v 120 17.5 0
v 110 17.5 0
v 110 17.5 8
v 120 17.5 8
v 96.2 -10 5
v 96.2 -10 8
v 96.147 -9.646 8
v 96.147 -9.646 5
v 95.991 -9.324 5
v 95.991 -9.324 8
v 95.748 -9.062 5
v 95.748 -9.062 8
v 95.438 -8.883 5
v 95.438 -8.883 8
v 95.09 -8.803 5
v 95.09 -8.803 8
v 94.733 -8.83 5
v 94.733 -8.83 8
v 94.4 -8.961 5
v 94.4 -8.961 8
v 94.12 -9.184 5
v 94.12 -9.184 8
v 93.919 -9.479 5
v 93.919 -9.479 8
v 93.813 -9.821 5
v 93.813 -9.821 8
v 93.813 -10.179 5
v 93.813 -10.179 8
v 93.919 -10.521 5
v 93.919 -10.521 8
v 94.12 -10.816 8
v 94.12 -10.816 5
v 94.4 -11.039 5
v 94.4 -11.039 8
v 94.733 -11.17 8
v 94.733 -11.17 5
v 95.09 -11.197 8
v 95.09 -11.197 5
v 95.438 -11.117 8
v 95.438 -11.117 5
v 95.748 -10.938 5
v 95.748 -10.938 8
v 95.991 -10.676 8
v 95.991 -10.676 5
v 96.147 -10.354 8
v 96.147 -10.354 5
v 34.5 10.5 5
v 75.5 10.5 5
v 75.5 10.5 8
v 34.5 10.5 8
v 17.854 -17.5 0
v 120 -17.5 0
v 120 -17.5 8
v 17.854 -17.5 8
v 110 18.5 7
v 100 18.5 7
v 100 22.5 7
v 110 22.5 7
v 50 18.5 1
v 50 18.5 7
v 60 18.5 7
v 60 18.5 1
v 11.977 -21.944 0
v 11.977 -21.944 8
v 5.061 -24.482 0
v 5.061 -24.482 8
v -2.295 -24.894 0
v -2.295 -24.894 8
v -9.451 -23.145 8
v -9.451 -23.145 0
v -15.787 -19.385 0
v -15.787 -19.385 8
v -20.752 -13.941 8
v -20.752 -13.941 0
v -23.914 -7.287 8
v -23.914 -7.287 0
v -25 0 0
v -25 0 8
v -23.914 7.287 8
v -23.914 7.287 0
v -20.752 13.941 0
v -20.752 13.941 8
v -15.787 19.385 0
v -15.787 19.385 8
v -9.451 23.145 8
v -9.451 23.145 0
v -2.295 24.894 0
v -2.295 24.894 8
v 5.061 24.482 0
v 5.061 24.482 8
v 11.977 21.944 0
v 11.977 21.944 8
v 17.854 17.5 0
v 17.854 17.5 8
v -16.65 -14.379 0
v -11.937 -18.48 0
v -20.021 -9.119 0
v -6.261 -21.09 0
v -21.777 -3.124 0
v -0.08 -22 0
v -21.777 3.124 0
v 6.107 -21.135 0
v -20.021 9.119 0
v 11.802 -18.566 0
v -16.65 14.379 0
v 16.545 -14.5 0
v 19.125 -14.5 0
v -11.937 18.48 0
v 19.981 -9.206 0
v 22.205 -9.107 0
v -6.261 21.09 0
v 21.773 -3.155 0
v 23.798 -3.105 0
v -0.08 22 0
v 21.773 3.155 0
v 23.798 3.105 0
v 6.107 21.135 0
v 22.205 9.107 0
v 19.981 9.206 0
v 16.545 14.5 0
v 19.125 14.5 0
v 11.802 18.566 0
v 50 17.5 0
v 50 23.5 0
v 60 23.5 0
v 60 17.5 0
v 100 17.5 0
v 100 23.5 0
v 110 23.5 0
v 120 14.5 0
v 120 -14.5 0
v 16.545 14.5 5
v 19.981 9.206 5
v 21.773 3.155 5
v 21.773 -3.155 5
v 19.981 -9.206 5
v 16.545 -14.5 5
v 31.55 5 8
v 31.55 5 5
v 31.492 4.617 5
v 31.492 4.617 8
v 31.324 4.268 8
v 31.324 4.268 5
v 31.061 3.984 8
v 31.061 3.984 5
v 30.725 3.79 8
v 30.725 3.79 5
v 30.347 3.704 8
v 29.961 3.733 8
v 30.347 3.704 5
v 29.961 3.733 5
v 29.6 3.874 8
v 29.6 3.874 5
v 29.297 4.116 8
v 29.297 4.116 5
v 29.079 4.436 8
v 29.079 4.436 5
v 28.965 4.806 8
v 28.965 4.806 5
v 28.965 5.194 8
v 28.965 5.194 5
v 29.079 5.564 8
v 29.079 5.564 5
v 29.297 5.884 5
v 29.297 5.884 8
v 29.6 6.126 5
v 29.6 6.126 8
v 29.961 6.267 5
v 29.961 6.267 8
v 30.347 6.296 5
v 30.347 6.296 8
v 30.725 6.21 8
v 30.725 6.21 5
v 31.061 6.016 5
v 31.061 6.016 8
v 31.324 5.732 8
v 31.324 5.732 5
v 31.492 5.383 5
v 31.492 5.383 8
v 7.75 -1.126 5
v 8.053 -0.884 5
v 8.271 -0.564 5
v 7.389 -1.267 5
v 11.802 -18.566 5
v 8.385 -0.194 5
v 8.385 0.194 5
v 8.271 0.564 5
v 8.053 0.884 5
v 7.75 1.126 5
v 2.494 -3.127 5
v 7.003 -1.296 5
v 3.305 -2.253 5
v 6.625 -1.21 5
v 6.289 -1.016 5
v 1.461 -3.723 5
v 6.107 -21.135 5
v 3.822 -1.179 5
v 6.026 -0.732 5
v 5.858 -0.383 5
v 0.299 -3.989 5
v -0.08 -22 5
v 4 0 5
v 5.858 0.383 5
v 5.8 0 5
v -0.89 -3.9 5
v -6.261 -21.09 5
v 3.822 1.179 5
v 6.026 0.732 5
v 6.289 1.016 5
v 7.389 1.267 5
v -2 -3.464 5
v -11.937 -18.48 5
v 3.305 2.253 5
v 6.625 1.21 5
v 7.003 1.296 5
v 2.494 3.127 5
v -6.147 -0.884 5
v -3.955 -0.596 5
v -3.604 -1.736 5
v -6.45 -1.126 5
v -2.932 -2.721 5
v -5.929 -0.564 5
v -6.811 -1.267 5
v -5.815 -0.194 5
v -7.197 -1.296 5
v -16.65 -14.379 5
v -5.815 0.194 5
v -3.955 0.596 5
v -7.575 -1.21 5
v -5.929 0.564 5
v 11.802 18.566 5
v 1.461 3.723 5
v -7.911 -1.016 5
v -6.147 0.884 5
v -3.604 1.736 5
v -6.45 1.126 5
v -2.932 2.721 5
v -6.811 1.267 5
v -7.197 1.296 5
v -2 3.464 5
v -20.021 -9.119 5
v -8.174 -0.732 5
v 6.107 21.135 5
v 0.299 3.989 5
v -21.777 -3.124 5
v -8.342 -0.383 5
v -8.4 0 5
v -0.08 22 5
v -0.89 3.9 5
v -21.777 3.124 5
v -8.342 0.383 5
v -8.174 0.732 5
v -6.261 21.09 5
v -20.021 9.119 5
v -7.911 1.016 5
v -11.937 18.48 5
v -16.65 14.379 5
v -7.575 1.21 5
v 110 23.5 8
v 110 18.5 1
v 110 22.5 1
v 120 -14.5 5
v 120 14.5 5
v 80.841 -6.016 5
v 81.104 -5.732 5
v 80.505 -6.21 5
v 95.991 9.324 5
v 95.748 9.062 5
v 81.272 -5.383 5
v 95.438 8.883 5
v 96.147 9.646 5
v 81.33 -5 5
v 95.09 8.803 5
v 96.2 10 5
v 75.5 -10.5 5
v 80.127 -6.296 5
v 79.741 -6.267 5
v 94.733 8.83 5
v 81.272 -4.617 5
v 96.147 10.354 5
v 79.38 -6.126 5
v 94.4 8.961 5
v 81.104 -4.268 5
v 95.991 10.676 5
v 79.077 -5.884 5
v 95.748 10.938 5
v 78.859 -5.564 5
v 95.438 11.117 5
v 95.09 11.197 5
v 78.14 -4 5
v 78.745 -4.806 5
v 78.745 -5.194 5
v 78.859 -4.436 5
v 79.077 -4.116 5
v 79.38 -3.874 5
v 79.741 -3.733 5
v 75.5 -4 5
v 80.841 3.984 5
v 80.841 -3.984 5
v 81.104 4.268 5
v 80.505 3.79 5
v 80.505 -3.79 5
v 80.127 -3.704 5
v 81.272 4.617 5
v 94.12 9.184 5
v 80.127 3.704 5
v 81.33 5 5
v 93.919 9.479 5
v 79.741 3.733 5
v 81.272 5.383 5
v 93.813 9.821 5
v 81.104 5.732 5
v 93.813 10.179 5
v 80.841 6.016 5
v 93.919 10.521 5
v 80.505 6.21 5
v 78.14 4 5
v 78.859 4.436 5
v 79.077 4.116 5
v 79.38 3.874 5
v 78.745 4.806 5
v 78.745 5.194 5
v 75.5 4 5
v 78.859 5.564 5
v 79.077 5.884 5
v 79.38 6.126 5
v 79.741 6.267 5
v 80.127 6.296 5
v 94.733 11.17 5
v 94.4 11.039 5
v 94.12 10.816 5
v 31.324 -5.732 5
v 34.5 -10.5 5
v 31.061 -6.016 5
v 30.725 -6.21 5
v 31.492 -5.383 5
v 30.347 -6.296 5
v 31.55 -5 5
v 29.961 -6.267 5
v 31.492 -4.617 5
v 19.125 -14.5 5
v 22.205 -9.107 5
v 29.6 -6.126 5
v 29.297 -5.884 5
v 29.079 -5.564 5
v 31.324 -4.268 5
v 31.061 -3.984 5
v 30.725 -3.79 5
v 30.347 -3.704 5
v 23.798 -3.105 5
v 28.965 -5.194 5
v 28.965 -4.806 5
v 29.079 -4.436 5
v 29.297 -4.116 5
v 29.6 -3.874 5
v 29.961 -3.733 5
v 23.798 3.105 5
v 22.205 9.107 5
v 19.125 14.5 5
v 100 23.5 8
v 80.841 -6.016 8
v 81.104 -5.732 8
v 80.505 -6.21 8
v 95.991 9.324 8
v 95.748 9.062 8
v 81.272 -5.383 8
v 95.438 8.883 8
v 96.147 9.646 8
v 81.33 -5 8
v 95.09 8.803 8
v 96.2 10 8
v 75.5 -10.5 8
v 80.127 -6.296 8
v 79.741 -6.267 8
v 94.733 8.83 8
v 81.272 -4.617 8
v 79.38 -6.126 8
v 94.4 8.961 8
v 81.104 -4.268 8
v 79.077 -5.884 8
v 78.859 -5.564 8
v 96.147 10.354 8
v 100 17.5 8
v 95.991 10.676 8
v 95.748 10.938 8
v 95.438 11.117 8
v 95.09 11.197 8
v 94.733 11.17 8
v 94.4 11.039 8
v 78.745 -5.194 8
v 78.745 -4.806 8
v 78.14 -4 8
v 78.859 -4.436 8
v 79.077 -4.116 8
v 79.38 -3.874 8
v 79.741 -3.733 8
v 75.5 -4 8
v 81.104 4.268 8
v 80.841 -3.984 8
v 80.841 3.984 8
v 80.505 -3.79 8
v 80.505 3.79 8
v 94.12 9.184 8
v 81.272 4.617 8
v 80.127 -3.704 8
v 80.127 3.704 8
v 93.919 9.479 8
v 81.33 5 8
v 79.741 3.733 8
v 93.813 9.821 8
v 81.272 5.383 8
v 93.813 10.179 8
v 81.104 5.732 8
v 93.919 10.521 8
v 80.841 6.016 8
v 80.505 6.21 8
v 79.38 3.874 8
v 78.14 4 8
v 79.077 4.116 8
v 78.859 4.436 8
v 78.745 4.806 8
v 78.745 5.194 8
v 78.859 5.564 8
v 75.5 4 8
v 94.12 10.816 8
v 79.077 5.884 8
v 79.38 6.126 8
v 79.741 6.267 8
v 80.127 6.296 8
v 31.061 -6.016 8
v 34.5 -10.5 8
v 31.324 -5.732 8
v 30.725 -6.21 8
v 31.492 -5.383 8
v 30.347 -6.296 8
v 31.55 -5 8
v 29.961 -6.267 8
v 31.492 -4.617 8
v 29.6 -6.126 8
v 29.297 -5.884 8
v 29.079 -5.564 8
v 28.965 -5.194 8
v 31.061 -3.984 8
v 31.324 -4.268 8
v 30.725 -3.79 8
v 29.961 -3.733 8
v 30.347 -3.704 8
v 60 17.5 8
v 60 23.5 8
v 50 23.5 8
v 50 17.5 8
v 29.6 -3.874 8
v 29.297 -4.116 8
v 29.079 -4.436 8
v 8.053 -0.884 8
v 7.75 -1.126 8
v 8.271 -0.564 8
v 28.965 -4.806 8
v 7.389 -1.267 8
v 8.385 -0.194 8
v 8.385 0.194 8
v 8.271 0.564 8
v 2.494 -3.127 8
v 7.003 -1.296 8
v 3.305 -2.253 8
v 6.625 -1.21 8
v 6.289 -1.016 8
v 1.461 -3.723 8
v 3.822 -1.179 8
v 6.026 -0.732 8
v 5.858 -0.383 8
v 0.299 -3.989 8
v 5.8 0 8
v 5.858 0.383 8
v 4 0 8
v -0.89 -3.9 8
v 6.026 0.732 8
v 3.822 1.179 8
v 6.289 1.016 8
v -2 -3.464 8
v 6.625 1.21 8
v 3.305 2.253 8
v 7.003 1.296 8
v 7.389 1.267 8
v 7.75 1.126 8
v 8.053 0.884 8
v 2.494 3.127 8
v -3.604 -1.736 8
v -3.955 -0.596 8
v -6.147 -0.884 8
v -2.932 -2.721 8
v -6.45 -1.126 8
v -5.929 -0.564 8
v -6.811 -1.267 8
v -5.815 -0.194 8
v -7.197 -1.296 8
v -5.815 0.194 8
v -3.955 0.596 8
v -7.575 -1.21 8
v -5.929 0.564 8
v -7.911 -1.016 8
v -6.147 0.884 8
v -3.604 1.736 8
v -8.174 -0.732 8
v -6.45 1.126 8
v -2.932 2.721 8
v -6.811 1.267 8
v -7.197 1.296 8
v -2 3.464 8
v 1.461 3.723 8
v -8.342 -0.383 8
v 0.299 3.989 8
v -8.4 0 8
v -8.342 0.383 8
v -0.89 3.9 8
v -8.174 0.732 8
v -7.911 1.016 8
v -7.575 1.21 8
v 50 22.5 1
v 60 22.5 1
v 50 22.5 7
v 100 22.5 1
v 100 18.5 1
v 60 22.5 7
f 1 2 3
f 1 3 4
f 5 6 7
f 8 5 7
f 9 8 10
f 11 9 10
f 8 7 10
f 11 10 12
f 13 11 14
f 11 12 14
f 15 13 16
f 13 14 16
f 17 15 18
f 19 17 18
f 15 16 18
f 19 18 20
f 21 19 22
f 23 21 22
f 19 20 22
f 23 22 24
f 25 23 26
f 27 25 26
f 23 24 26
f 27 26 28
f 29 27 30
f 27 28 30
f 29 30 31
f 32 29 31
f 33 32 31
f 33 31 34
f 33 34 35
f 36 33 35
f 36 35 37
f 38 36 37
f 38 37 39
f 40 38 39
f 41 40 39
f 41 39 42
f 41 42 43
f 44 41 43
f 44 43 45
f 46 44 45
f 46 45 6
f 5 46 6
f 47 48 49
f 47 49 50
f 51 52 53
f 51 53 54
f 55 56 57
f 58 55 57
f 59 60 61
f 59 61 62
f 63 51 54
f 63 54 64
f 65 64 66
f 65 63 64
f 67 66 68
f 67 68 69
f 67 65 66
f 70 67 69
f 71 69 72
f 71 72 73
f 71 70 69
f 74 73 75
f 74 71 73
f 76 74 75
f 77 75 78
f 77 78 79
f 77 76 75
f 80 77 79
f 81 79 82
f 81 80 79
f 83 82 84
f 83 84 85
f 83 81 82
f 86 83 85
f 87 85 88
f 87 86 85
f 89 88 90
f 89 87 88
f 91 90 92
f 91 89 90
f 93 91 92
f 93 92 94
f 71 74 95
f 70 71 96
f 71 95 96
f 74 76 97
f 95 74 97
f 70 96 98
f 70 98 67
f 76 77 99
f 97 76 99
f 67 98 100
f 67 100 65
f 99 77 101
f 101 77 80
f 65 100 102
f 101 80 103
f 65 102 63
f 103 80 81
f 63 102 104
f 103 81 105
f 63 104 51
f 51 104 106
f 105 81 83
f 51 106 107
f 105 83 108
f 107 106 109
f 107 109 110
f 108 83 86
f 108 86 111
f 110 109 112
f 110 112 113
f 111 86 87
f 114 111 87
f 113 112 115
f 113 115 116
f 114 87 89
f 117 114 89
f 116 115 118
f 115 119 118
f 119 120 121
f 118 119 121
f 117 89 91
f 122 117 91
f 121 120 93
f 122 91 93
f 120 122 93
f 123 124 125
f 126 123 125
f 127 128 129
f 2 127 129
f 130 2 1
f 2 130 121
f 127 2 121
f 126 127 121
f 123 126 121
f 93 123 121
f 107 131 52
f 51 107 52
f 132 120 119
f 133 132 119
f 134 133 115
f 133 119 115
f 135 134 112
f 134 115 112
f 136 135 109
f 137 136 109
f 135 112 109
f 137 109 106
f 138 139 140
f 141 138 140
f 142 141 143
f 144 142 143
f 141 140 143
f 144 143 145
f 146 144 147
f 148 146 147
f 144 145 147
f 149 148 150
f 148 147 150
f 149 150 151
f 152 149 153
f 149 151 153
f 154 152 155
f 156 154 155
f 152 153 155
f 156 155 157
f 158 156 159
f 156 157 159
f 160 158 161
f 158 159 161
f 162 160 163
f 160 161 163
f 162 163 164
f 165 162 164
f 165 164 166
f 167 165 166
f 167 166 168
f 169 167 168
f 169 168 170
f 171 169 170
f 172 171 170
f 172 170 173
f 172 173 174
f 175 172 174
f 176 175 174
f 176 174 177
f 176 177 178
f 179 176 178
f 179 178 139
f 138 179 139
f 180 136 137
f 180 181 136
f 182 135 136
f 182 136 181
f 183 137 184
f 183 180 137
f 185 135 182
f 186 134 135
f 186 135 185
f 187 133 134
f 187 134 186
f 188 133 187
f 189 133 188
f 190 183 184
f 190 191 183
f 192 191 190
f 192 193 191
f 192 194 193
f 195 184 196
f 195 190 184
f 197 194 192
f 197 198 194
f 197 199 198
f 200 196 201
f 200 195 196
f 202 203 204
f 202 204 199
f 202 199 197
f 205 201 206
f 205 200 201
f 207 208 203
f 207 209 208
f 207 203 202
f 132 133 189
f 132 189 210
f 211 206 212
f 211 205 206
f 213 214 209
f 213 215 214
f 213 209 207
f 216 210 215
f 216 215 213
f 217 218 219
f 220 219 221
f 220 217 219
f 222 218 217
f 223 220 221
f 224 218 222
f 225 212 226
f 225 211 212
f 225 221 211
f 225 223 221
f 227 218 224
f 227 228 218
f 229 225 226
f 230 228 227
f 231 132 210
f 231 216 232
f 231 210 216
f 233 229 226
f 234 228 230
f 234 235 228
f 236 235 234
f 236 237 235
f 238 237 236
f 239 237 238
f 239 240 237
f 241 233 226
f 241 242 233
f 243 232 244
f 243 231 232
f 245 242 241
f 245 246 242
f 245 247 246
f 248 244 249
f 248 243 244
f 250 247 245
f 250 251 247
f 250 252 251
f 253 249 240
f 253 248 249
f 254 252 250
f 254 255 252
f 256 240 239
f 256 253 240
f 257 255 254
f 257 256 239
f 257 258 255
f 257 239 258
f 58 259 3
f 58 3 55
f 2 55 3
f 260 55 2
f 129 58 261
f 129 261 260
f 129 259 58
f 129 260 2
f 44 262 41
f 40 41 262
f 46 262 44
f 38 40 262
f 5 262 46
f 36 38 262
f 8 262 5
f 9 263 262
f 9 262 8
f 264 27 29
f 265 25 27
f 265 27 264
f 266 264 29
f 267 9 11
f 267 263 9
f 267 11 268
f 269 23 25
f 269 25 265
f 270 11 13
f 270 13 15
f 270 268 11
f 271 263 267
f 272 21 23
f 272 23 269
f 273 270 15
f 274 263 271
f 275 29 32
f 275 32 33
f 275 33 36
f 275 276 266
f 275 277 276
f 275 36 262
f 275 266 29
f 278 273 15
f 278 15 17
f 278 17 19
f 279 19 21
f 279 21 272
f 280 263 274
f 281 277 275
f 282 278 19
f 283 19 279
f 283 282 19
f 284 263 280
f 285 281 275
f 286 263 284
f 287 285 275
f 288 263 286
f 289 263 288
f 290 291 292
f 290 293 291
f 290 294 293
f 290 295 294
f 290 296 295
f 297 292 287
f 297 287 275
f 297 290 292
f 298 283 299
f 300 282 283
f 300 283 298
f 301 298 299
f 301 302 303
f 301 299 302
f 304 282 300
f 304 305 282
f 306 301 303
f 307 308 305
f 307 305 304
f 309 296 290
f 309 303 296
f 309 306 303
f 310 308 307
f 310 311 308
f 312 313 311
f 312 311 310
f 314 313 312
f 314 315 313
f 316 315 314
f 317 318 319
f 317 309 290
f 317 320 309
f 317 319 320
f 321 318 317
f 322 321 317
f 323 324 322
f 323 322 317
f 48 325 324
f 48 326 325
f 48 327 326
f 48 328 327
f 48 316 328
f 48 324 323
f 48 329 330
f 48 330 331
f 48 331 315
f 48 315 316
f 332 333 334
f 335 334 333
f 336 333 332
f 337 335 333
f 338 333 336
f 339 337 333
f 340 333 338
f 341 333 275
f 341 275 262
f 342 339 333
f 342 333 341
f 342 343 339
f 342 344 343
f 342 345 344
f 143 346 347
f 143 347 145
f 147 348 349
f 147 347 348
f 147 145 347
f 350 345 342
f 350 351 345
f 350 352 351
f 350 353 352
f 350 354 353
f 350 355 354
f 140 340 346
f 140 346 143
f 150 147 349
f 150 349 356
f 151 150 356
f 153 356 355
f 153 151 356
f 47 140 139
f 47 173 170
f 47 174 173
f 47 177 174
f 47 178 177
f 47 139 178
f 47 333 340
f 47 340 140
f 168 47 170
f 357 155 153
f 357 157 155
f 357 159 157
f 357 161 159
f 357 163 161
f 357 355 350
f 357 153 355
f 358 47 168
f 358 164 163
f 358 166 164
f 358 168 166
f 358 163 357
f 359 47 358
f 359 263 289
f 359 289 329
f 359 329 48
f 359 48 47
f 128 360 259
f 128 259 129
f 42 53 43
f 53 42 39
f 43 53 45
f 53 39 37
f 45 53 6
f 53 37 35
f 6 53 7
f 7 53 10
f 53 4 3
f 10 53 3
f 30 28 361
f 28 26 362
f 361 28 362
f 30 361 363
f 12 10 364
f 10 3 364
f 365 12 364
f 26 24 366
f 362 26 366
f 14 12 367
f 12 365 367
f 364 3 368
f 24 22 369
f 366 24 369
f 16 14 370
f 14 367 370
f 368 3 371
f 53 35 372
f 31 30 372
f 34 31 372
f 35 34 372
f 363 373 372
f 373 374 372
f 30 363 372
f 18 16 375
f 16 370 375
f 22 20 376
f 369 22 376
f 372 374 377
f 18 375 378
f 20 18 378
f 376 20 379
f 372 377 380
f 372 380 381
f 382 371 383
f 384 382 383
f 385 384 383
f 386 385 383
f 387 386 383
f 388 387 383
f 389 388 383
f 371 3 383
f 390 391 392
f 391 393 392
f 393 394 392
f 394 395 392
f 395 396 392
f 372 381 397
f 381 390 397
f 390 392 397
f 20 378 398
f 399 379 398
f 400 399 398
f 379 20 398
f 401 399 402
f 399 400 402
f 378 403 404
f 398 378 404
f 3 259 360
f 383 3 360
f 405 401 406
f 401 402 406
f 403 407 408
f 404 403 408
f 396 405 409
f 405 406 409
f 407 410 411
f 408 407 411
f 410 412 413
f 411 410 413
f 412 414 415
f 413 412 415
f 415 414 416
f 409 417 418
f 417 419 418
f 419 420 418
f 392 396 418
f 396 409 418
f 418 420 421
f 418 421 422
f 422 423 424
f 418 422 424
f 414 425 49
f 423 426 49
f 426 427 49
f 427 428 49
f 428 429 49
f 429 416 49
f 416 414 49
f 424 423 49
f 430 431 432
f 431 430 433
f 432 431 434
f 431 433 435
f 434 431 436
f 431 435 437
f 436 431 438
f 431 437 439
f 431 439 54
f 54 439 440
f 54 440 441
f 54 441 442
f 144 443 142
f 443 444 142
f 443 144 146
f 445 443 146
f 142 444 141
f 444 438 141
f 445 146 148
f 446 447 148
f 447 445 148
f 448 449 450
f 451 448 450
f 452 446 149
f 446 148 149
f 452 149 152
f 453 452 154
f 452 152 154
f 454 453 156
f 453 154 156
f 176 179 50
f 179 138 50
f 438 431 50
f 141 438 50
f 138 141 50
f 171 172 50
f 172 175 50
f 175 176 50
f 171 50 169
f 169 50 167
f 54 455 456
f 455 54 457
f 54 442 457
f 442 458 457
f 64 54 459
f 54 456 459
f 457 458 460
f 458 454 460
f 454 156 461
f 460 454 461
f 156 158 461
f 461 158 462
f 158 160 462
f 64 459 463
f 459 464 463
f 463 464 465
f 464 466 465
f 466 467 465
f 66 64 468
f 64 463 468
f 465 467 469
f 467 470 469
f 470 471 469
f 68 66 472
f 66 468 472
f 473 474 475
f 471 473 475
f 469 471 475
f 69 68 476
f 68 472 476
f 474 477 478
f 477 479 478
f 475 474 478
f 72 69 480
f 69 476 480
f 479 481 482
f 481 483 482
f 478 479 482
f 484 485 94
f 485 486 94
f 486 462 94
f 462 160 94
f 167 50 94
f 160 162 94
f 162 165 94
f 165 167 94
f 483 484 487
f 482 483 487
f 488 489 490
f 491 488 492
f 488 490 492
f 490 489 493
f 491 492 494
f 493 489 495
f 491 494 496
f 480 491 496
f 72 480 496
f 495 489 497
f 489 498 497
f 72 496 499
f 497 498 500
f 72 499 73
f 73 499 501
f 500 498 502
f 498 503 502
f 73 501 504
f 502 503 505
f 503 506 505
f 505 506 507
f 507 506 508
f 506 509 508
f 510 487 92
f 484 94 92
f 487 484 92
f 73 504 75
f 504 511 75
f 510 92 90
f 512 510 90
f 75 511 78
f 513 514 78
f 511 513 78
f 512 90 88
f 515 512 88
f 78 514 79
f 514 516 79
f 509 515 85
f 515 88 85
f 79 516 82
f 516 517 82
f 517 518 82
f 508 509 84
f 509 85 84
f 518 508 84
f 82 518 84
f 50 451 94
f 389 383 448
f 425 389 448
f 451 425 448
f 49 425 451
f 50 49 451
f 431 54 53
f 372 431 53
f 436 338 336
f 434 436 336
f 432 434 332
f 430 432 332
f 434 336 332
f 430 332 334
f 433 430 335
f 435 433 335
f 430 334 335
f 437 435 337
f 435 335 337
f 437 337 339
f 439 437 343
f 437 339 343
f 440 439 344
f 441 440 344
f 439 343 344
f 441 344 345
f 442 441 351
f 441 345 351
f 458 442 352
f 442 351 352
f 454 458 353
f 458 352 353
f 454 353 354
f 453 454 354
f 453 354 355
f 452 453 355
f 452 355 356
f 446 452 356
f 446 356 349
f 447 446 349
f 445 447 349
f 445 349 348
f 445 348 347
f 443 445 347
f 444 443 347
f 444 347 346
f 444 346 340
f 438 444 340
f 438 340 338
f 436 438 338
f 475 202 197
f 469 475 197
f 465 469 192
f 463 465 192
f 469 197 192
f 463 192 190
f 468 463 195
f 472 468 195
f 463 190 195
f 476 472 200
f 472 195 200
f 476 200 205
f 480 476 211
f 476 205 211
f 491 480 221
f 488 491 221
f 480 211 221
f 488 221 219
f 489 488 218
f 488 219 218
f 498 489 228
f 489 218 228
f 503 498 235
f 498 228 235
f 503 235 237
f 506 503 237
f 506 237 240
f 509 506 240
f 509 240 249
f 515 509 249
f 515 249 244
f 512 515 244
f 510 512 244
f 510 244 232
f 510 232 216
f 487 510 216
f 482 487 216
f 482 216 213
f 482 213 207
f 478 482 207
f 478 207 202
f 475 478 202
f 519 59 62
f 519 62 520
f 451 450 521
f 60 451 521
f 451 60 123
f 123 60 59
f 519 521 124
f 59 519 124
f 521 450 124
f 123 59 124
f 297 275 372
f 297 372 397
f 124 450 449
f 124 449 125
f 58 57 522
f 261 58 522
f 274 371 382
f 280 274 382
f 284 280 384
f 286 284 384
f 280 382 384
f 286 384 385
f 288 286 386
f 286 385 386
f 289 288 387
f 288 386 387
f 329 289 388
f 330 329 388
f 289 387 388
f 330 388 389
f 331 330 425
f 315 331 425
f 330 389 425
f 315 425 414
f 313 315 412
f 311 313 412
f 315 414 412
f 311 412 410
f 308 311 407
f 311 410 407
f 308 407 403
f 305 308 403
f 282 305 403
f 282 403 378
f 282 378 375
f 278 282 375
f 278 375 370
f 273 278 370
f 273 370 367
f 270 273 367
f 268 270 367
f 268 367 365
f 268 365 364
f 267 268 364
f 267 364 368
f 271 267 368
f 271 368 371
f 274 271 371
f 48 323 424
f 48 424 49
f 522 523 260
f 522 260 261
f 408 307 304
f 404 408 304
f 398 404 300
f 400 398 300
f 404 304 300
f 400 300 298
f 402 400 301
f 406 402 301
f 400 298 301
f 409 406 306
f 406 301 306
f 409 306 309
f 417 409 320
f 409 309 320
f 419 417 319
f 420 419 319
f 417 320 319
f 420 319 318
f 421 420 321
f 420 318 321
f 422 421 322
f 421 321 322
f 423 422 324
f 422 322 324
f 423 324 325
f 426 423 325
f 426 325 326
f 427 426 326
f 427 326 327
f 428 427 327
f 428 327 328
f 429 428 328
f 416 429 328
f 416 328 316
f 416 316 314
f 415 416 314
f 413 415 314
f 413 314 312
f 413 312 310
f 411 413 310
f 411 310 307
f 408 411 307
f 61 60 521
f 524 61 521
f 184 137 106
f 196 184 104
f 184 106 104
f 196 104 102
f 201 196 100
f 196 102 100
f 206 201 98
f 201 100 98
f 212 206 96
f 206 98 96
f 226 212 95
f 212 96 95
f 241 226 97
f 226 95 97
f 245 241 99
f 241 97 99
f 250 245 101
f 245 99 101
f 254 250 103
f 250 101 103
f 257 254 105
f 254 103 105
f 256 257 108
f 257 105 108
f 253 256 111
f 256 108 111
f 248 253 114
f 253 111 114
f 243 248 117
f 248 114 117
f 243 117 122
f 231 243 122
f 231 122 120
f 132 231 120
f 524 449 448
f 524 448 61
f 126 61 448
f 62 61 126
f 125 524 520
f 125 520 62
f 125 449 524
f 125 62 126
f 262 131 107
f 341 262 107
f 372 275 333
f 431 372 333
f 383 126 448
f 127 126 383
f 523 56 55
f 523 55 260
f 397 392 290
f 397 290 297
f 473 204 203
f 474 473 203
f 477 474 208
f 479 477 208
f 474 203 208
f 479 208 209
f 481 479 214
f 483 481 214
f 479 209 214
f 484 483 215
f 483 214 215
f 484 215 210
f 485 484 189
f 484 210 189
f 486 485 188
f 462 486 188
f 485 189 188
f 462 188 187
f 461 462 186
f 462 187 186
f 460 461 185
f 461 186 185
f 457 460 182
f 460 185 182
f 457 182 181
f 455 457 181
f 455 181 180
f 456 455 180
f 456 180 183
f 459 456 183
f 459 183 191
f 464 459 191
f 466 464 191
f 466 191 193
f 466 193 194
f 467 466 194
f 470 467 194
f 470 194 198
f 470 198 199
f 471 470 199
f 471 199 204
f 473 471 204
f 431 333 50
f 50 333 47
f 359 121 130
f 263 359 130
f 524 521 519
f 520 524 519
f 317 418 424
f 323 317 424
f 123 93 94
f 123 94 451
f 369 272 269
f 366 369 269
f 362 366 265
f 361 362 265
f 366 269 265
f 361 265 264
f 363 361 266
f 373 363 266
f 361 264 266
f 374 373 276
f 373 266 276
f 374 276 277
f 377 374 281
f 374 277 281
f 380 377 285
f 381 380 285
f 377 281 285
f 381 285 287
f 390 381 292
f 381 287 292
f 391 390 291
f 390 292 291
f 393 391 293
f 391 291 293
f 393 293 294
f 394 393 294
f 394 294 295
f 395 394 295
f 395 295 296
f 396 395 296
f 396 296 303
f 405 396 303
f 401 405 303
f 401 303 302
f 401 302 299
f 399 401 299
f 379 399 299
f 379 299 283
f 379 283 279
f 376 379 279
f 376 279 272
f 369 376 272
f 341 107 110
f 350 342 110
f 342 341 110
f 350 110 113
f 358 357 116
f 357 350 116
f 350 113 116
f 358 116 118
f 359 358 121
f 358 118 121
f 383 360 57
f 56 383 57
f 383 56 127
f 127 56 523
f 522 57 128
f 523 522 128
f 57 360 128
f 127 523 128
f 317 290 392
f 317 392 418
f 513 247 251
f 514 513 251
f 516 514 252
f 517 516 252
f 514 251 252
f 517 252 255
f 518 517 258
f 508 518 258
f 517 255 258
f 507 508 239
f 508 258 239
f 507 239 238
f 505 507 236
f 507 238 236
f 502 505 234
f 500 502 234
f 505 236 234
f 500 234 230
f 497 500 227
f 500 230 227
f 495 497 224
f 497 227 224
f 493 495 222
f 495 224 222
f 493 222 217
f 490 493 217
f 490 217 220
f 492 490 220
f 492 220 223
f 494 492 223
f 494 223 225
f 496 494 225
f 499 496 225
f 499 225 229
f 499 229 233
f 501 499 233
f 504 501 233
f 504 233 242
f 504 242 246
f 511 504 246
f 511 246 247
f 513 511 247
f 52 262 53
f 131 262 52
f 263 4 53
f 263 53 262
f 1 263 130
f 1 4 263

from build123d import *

# Parameters (mm, degrees)
DODANIE_WYCI_GNI_CIE1_DEPTH = 8
OTW_R_POD_RUB_M22_D         = 2.6
SKORUPA1_T                  = -3
DODANIE_WYCI_GNI_CIE2_REACH = 228.526
OTW_R_POD_RUB_M21_D         = 2.6
WYTNIJ_WYCI_GNI_CIE1_REACH  = 228.526
SZKIC7_W                    = 41
SZKIC7_H                    = 21
OTWORY_USTALAJ_CE_8_0MM1_D  = 8
OTW_R_POD_RUB_M23_D         = 2.6
WYTNIJ_WYCI_GNI_CIE2_REACH  = 228.526
SZKIC13_W                   = 5.14
SZKIC13_H                   = 8
SZKIC18_W                   = 8
SZKIC18_H                   = 6
SZKIC18_W_2                 = 6
SZKIC18_H_2                 = 4
DODANIE_WYCI_GNI_CIE3_DEPTH = 10
SZYK_LINIOWY1_COUNT         = 2
SZYK_LINIOWY1_PITCH         = 50
OTW_R_POD_RUB_M24_D         = 2.4


with BuildPart() as part:
    # Szkic1 → Dodanie-wyciągnięcie1 (new body)
    with BuildSketch(Plane.XY):
        with BuildLine():
            Line((17.853571071, 17.5), (182.146428929, 17.5))
            ThreePointArc((182.146428929, 17.5), (225, 0), (182.146428929, -17.5))
            Line((182.146428929, -17.5), (17.853571071, -17.5))
            ThreePointArc((17.853571071, -17.5), (-25, 0), (17.853571071, 17.5))
        make_face()
    extrude(amount=DODANIE_WYCI_GNI_CIE1_DEPTH)

    # Otwór pod śrubę M22 (through all)
    with Locations(Plane(origin=(0, 0, 8), x_dir=(-1, 0, 0), z_dir=(0, 0, 1))):
        with Locations((-200, 0)):
            Hole(OTW_R_POD_RUB_M22_D / 2)

    # Skorupa1
    skorupa1_openings = [part.faces().sort_by_distance(p)[0] for p in [
        (99.943079522, 0, 0),
    ]]
    offset(amount=SKORUPA1_T, openings=skorupa1_openings, kind=Kind.INTERSECTION)

    # Szkic15 → Dodanie-wyciągnięcie2 (add, up to next)
    with BuildSketch(Plane(origin=(0, 0, 0), x_dir=(-1, 0, 0), z_dir=(0, 0, -1)), mode=Mode.PRIVATE) as dodanie_wyci_gni_cie2_sk1:
        with BuildLine():
            Line((-16.545392108, -14.5), (-19.124591499, -14.5))
            ThreePointArc((-19.124591499, -14.5), (-24, 0), (-19.124591499, 14.5))
            Line((-19.124591499, 14.5), (-16.545392108, 14.5))
            ThreePointArc((-16.545392108, 14.5), (-22, 0), (-16.545392108, -14.5))
        make_face()
    dodanie_wyci_gni_cie2_tool1 = extrude(dodanie_wyci_gni_cie2_sk1.sketch, amount=-DODANIE_WYCI_GNI_CIE2_REACH, mode=Mode.PRIVATE) - part.part
    # Szkic15 → Dodanie-wyciągnięcie2 (add, up to next)
    with BuildSketch(Plane(origin=(0, 0, 0), x_dir=(-1, 0, 0), z_dir=(0, 0, -1)), mode=Mode.PRIVATE) as dodanie_wyci_gni_cie2_sk2:
        with BuildLine():
            Line((-180.875408501, -14.5), (-183.454607892, -14.5))
            ThreePointArc((-183.454607892, -14.5), (-178, 0), (-183.454607892, 14.5))
            Line((-183.454607892, 14.5), (-180.875408501, 14.5))
            ThreePointArc((-180.875408501, 14.5), (-176, 0), (-180.875408501, -14.5))
        make_face()
    dodanie_wyci_gni_cie2_tool2 = extrude(dodanie_wyci_gni_cie2_sk2.sketch, amount=-DODANIE_WYCI_GNI_CIE2_REACH, mode=Mode.PRIVATE) - part.part
    add(dodanie_wyci_gni_cie2_tool1.solids().sort_by_distance((17.834992, 14.200572, 0))[0])
    add(dodanie_wyci_gni_cie2_tool2.solids().sort_by_distance((182.165008, -14.200572, 0))[0])

    # Otwór pod śrubę M21 (through all)
    with Locations(Plane.XY.offset(8)):
        with Locations((7.1, 0), (-7.1, 0)):
            Hole(OTW_R_POD_RUB_M21_D / 2)

    # Szkic7 → Wytnij-wyciągnięcie1 (cut, up to next)
    with BuildSketch(Plane(origin=(0, 0, 0), x_dir=(-1, 0, 0), z_dir=(0, 0, -1)), mode=Mode.PRIVATE) as wytnij_wyci_gni_cie1_sk1:
        with Locations((-55, 0)):
            Rectangle(SZKIC7_W, SZKIC7_H)
    wytnij_wyci_gni_cie1_tool1 = extrude(wytnij_wyci_gni_cie1_sk1.sketch, amount=-WYTNIJ_WYCI_GNI_CIE1_REACH, mode=Mode.PRIVATE) & part.part
    add(wytnij_wyci_gni_cie1_tool1.solids().sort_by_distance((55, 0, 0))[0], mode=Mode.SUBTRACT)

    # Otwory ustalające Ø8.0mm1 (through all)
    with Locations(Plane(origin=(0, 0, 8), x_dir=(-1, 0, 0), z_dir=(0, 0, 1))):
        with Locations((0, 0)):
            Hole(OTWORY_USTALAJ_CE_8_0MM1_D / 2)

    # Otwór pod śrubę M23 (through all)
    with Locations(Plane(origin=(0, 0, 8), x_dir=(-1, 0, 0), z_dir=(0, 0, 1))):
        with Locations((-80.03, 5), (-80.03, -5), (-30.25, -5), (-30.25, 5)):
            Hole(OTW_R_POD_RUB_M23_D / 2)

    # Szkic13 → Wytnij-wyciągnięcie2 (cut, up to next)
    with BuildSketch(Plane(origin=(0, 0, 0), x_dir=(-1, 0, 0), z_dir=(0, 0, -1)), mode=Mode.PRIVATE) as wytnij_wyci_gni_cie2_sk1:
        with Locations((-75.57, 0)):
            Rectangle(SZKIC13_W, SZKIC13_H)
    wytnij_wyci_gni_cie2_tool1 = extrude(wytnij_wyci_gni_cie2_sk1.sketch, amount=-WYTNIJ_WYCI_GNI_CIE2_REACH, mode=Mode.PRIVATE) & part.part
    add(wytnij_wyci_gni_cie2_tool1.solids().sort_by_distance((75.57, 0, 0))[0], mode=Mode.SUBTRACT)

    # Szkic18 → Dodanie-wyciągnięcie3 (add)
    with BuildSketch(Plane(origin=(50, 0, 0), x_dir=(0, 0, -1), z_dir=(1, 0, 0))):
        with Locations((-4, 20.5)):
            Rectangle(SZKIC18_W, SZKIC18_H)
        with Locations((-4, 20.5)):
            Rectangle(SZKIC18_W_2, SZKIC18_H_2, mode=Mode.SUBTRACT)
    dodanie_wyci_gni_cie3 = extrude(amount=DODANIE_WYCI_GNI_CIE3_DEPTH)

    # Szyk liniowy1: Dodanie-wyciągnięcie3 ×2
    with Locations(*[(i * SZYK_LINIOWY1_PITCH, 0, 0) for i in range(1, SZYK_LINIOWY1_COUNT)]):
        add(dodanie_wyci_gni_cie3)

    # Otwór pod śrubę M24 (through all)
    with Locations(Plane(origin=(0, 0, 5), x_dir=(-1, 0, 0), z_dir=(0, 0, -1))):
        with Locations((-145, -10), (-145, 10), (-95, 10), (-95, -10)):
            Hole(OTW_R_POD_RUB_M24_D / 2)

    # Cięcie powierzchnią1
    split(bisect_by=Plane(origin=(120, 0, 0), x_dir=(0, 0, -1), z_dir=(1, 0, 0)), keep=Keep.BOTTOM)


solid = part.part
